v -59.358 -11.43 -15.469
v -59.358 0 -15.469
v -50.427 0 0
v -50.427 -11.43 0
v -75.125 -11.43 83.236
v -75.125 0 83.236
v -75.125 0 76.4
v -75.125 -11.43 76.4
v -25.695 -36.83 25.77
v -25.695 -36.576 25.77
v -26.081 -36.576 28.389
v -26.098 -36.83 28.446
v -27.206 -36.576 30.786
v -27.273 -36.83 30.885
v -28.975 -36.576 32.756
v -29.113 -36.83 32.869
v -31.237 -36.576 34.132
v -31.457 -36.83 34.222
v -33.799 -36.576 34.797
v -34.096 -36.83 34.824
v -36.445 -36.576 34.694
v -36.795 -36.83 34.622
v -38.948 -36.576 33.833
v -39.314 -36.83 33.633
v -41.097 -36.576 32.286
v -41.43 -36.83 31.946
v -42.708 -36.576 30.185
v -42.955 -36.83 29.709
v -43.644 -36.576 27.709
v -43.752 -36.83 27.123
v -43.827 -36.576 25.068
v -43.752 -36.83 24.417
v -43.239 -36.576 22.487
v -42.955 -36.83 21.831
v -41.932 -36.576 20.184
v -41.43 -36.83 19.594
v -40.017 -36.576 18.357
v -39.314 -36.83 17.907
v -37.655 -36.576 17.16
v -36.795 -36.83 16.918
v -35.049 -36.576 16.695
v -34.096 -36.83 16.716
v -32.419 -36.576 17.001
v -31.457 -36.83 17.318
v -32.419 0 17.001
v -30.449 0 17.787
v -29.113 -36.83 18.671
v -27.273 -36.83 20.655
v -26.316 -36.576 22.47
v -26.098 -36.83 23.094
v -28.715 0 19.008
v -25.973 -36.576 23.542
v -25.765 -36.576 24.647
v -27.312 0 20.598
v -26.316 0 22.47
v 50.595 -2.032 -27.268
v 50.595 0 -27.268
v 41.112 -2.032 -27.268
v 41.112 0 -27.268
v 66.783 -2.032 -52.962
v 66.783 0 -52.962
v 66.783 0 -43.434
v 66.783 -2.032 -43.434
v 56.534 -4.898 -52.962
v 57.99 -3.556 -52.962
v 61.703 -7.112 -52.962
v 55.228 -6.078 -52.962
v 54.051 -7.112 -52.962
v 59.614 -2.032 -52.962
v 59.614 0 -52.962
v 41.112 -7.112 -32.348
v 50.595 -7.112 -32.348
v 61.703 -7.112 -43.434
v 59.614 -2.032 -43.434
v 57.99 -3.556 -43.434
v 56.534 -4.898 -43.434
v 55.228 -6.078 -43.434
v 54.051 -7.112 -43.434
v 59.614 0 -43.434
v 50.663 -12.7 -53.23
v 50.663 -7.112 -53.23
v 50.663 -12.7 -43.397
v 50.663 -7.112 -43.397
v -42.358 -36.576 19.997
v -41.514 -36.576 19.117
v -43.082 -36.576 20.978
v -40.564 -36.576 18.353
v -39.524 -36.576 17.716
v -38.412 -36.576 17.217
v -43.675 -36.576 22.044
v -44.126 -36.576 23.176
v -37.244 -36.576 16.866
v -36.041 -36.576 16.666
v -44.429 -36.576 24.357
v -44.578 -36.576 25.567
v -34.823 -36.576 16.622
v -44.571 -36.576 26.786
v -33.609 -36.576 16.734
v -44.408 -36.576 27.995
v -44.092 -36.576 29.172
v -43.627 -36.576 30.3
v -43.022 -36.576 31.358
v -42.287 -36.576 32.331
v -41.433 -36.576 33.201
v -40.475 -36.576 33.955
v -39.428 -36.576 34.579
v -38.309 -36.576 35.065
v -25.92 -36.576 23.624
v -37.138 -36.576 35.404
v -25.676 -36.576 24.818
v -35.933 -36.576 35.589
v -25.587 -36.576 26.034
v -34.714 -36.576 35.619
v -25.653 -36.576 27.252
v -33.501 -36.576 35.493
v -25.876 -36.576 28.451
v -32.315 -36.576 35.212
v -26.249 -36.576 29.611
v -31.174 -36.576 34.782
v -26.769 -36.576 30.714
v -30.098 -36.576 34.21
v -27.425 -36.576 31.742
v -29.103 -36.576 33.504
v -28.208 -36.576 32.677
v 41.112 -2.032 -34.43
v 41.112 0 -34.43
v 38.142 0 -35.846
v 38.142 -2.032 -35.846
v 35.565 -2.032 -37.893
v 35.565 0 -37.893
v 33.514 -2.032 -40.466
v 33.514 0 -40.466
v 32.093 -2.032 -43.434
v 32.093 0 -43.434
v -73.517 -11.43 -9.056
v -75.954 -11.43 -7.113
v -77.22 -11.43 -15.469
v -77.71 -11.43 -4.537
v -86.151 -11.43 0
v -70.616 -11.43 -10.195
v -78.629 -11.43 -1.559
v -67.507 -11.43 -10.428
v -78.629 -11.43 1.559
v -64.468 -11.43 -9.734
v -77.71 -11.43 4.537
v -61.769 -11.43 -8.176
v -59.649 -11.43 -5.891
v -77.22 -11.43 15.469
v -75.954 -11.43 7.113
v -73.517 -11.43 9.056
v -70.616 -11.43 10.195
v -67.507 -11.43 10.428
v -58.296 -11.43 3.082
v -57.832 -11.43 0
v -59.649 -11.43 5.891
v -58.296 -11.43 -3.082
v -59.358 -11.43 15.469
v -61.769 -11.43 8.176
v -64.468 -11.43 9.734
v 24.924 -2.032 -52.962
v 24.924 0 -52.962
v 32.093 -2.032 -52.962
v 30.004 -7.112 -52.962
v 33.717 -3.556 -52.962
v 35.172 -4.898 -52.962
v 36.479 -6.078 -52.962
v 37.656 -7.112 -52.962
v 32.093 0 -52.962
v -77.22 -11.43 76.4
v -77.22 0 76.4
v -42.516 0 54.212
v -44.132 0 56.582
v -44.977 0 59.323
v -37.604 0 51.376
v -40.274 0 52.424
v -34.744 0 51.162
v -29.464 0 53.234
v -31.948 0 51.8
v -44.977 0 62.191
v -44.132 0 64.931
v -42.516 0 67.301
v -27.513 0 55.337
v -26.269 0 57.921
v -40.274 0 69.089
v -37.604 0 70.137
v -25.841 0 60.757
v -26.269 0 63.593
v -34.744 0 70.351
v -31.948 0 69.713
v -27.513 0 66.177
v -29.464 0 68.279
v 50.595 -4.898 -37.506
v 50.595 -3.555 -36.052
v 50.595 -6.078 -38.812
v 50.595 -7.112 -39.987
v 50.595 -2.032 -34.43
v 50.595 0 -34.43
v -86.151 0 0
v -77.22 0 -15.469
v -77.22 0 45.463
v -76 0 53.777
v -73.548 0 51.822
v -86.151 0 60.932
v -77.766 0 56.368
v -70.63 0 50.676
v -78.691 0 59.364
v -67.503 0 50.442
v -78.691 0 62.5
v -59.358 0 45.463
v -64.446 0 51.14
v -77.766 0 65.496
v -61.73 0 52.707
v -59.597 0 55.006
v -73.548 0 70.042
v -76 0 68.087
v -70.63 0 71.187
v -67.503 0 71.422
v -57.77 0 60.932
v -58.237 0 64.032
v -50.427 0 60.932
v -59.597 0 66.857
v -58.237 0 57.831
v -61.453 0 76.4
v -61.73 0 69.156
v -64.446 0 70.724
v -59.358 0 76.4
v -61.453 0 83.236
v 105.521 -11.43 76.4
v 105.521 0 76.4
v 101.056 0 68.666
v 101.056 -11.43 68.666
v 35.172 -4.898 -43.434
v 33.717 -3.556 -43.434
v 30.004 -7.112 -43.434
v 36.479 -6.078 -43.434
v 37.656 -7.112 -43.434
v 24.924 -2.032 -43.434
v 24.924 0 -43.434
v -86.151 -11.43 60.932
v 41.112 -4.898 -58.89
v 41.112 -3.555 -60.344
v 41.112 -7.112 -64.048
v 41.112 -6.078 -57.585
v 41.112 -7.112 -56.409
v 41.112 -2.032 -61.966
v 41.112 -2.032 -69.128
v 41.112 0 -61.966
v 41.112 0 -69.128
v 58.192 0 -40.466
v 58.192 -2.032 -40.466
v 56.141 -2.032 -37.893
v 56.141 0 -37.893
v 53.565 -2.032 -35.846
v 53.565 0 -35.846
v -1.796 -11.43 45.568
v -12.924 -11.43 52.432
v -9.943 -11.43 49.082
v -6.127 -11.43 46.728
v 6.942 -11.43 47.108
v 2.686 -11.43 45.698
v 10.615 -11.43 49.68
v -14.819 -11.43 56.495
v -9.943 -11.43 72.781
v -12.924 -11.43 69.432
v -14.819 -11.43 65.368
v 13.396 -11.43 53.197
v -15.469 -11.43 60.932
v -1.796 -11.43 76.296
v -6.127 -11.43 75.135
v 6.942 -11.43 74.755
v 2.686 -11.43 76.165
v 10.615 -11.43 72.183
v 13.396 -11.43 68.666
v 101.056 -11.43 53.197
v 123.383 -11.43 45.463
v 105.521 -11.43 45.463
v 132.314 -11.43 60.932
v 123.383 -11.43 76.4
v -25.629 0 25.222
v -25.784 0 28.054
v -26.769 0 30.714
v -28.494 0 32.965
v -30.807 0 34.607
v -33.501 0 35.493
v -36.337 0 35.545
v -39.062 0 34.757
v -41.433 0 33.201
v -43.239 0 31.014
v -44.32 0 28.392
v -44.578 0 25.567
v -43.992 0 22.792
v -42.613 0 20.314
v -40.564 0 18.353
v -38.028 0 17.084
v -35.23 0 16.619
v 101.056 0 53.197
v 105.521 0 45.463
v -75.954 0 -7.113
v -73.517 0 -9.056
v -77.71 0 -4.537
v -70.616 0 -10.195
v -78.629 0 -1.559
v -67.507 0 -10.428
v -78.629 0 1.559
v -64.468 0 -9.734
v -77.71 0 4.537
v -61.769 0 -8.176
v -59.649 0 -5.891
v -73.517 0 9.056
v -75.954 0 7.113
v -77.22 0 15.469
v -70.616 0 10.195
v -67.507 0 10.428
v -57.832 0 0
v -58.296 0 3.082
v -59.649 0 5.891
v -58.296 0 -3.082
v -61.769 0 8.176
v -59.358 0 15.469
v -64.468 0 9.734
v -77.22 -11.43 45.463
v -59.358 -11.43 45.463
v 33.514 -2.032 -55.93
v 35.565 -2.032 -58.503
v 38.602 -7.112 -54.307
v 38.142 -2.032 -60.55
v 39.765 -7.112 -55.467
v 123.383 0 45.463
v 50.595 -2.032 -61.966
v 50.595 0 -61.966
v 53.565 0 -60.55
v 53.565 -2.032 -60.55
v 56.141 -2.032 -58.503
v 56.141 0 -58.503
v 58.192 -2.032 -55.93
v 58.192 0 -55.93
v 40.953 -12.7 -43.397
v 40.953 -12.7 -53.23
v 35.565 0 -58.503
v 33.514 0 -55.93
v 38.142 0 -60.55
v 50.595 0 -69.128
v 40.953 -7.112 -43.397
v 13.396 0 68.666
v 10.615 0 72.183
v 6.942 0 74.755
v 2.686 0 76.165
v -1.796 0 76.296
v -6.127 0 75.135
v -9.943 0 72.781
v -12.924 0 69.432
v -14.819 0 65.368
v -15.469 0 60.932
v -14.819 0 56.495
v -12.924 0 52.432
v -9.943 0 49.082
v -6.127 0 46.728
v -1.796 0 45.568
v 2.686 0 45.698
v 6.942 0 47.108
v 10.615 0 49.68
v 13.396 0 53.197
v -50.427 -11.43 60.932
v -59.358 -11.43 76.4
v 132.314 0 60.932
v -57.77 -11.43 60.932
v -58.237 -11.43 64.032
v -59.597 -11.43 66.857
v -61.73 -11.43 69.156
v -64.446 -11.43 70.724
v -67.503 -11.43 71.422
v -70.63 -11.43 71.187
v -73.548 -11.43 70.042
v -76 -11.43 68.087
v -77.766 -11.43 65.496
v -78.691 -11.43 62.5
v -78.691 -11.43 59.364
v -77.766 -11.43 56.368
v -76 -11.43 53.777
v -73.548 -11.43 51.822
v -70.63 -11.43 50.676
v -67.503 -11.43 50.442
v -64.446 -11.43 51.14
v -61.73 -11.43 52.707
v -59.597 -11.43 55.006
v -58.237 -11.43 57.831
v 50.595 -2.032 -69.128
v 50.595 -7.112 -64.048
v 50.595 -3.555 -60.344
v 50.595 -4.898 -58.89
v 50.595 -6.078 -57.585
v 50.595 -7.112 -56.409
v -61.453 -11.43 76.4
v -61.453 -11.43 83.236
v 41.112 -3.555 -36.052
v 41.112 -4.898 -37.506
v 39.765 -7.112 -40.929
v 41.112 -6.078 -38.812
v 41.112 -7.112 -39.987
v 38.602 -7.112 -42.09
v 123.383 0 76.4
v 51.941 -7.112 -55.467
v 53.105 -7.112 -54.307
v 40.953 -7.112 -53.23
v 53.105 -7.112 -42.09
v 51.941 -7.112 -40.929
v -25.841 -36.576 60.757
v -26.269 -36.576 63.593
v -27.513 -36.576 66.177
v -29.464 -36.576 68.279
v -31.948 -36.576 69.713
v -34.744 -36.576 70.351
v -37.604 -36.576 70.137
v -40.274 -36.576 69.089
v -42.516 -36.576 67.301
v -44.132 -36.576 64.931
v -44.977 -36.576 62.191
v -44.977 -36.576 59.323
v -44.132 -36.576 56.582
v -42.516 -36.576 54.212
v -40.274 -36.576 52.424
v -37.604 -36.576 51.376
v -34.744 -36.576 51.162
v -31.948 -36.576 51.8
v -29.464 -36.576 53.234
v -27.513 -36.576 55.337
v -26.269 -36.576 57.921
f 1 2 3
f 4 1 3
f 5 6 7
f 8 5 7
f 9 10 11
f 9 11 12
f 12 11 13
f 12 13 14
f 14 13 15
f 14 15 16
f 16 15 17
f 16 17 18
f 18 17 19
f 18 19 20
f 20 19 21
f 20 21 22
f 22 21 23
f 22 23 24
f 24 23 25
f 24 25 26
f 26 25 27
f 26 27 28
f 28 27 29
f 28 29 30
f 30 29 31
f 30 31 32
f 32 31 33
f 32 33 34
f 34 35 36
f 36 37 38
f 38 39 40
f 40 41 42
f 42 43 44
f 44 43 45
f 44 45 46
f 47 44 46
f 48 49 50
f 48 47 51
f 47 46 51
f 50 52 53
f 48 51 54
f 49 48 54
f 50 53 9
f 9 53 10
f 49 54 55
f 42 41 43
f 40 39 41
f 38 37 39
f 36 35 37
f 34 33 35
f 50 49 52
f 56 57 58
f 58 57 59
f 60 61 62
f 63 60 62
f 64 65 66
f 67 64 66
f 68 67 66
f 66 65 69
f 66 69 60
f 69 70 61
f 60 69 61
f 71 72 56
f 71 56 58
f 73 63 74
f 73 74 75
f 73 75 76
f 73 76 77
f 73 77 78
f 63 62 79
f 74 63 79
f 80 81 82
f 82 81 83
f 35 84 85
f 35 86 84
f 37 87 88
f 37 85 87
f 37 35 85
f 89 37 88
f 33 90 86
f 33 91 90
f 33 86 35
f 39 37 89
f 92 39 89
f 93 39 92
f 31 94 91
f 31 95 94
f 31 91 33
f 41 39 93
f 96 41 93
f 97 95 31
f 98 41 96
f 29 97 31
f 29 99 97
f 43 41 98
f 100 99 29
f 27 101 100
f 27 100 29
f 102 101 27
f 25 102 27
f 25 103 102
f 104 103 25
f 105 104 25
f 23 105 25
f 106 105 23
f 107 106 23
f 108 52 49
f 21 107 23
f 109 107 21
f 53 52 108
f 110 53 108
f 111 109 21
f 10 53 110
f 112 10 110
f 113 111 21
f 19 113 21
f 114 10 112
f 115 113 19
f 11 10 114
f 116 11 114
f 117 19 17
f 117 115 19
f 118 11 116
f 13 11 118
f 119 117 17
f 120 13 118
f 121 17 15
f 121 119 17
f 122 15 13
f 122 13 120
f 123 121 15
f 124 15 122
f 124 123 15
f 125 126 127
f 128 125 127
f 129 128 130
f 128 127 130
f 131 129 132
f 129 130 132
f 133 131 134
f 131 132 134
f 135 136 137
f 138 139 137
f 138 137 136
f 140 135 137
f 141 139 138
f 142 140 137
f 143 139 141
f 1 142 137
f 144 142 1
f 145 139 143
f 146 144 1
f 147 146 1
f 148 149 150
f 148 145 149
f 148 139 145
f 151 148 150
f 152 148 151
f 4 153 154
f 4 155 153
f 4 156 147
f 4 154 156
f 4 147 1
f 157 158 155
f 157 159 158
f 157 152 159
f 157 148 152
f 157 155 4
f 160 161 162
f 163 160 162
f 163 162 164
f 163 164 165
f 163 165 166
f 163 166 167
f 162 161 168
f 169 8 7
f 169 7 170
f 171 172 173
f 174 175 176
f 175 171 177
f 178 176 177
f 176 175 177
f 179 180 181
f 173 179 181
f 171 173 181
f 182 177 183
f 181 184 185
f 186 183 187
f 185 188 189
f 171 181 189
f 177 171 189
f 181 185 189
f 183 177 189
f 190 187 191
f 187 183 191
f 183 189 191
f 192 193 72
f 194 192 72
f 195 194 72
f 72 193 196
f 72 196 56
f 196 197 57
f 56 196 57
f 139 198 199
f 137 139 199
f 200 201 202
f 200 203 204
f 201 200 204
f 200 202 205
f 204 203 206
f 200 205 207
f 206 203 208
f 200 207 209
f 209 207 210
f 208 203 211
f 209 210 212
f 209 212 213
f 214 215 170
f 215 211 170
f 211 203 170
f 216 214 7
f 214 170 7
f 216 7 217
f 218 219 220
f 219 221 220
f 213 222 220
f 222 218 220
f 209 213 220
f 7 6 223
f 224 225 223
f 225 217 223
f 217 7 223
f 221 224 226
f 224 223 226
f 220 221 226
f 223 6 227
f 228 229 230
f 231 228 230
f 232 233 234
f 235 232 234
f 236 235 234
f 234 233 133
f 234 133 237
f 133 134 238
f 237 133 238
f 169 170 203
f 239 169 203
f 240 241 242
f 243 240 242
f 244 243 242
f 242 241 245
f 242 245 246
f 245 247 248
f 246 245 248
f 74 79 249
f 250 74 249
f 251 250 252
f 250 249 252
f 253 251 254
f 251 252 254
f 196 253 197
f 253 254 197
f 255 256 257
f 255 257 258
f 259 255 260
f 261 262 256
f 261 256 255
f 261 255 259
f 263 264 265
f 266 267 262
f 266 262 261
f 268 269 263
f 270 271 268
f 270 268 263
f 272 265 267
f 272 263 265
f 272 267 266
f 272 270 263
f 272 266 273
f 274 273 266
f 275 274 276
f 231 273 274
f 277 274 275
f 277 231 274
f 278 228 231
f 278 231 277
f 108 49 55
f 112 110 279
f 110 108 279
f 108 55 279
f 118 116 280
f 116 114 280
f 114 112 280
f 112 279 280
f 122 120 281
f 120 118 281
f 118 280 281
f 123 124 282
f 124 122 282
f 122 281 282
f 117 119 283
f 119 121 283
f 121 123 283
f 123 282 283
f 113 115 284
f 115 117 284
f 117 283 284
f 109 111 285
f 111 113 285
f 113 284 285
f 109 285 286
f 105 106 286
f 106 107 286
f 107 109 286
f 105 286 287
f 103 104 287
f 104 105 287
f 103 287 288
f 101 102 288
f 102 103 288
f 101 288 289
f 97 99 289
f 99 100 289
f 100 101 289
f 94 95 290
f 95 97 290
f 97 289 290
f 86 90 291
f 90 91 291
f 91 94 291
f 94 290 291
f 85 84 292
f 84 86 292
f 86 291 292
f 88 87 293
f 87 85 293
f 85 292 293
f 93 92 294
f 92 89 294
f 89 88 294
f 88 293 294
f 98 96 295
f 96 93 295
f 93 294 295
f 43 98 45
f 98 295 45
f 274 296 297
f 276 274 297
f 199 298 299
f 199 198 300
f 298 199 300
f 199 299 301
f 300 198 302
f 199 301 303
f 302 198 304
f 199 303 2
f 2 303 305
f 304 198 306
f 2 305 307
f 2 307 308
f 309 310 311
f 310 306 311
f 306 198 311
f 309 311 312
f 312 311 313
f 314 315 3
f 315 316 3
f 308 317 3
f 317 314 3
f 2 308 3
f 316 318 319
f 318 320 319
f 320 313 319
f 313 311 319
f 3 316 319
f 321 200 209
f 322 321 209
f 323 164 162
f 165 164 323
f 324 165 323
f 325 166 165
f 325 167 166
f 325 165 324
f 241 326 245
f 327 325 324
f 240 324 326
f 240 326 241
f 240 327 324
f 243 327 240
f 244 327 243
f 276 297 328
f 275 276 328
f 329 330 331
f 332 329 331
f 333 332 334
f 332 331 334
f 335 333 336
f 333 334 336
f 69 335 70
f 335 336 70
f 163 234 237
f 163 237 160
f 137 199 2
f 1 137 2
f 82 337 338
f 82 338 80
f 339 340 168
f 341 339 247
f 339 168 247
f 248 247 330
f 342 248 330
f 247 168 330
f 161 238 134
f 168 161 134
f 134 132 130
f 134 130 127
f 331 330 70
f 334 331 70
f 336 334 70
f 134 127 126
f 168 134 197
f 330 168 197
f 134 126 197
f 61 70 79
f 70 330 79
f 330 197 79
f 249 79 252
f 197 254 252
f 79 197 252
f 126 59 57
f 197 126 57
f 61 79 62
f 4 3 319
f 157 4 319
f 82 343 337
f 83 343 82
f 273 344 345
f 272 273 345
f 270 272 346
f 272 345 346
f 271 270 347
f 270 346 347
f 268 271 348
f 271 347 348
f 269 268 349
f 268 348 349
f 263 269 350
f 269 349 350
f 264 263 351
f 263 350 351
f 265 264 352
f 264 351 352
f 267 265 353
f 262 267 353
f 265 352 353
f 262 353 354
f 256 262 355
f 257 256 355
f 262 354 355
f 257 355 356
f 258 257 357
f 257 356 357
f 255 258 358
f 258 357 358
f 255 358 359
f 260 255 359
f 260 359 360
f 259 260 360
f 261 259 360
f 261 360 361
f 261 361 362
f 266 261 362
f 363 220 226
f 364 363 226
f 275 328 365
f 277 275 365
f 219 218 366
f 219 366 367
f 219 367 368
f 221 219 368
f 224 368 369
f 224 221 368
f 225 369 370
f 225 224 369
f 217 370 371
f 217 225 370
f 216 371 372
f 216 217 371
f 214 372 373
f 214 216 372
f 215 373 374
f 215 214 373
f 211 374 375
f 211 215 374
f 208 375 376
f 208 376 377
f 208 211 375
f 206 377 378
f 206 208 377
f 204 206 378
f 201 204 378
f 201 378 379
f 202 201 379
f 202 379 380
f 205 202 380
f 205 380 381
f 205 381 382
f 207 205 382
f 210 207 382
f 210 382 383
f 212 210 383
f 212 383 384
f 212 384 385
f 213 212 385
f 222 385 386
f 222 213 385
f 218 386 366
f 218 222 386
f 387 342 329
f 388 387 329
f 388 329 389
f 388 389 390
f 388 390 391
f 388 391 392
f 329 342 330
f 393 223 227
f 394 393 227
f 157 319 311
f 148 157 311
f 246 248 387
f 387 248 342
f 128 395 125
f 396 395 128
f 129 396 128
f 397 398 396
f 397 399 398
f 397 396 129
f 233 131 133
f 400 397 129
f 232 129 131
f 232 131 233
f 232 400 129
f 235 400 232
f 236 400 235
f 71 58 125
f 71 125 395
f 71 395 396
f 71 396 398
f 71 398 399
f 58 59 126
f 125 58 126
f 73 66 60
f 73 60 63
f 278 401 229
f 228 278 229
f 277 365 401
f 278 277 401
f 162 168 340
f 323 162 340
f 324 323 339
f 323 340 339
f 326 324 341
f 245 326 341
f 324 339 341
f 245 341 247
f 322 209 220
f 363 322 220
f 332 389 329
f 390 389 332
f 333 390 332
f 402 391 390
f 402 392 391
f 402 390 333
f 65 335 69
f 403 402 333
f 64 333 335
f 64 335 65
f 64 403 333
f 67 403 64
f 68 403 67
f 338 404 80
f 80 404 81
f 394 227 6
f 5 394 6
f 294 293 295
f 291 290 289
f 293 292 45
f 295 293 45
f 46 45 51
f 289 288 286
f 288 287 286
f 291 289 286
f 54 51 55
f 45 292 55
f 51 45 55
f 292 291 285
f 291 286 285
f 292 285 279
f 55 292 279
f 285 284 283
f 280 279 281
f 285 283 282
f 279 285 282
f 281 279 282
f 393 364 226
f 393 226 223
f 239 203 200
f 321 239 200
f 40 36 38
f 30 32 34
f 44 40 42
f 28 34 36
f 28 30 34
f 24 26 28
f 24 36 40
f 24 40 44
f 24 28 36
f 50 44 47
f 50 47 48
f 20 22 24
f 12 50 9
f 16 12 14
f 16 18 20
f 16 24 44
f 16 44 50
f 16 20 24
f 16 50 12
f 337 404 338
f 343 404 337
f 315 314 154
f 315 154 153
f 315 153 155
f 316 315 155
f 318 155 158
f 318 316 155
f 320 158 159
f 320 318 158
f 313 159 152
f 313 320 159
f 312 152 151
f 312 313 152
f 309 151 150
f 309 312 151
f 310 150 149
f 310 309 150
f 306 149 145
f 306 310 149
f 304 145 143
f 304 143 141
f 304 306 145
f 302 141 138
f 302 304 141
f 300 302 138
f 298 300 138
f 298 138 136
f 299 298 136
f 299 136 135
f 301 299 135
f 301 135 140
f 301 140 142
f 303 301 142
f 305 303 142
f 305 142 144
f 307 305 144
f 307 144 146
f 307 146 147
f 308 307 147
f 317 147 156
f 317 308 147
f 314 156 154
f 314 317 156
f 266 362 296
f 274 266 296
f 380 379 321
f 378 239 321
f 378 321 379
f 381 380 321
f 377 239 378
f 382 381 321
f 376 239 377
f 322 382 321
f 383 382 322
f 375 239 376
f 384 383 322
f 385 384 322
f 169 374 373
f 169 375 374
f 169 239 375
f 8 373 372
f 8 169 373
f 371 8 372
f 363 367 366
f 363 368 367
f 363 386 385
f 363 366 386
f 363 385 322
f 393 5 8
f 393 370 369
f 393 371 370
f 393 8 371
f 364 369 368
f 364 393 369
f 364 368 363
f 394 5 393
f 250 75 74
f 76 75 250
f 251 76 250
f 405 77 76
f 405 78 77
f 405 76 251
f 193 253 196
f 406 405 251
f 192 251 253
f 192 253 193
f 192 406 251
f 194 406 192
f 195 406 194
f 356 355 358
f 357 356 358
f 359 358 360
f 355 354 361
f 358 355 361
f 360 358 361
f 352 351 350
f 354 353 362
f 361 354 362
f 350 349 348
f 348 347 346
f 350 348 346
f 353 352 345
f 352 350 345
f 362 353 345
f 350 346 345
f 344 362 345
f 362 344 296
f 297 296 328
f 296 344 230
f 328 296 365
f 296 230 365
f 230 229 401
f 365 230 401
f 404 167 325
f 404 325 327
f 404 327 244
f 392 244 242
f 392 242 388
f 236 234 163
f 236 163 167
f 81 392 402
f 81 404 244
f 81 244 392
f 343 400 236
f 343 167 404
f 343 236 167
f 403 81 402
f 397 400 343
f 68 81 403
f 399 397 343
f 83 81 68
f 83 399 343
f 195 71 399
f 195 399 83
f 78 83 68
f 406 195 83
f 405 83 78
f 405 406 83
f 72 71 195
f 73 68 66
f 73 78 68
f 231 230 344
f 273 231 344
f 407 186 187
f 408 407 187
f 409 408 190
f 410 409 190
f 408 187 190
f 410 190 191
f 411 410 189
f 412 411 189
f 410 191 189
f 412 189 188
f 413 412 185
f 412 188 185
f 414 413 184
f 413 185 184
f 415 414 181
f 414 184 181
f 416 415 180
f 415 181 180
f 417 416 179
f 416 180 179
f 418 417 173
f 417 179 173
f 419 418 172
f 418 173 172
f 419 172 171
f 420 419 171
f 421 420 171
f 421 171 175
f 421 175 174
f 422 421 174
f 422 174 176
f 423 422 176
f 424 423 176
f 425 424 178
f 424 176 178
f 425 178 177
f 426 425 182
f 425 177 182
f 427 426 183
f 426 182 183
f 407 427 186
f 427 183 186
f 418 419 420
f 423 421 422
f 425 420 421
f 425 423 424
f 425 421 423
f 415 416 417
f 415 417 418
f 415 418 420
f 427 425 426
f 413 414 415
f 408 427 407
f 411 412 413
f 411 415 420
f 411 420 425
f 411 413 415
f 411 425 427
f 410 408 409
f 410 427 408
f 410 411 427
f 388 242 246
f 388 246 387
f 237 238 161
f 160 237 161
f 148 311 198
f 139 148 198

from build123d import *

# Parameters (mm, degrees)
F0_R      = 10.519302146
F1_DEPTH  = 11.43
F0_R_2    = 10.4571143602
F2_R      = 9.5042113309
F3_DEPTH  = 36.576
F2_R_2    = 9.621642993
F5_DEPTH  = 7.112
F6_SIZE   = 5.08
F7_W      = 9.7099430859
F7_H      = 9.8328515887
F8_DEPTH  = 12.7
F9_R      = 9.0793803352
F10_DEPTH = 36.83


with BuildPart() as f1:
    # F0 (on Front) → F1 (new body)
    with BuildSketch(Plane.XZ):
        Polygon((-75.1246213913, 76.4004662633), (-77.2196794092, 76.4004662633), (-86.1505557177, 60.9317347407), (-77.2196794092, 45.4630032182), (-59.357926792, 45.4630032182), (-50.4270504834, 60.9317347407), (-59.357926792, 76.4004662633), (-61.4529848099, 76.4004662633), (-61.4529848099, 69.5646479726), (-68.2888031006, 76.4004662633), (-75.1246213913, 69.5646479726), align=None)
        with Locations((-68.2888031006, 60.9317347407)):
            Circle(F0_R, mode=Mode.SUBTRACT)
        Polygon((-75.1246213913, 83.236284554), (-75.1246213913, 76.4004662633), (-68.2888031006, 76.4004662633), (-61.4529848099, 76.4004662633), (-61.4529848099, 83.236284554), align=None)
        Polygon((-68.2888031006, 76.4004662633), (-75.1246213913, 76.4004662633), (-75.1246213913, 69.5646479726), align=None)
        Polygon((-61.4529848099, 76.4004662633), (-68.2888031006, 76.4004662633), (-61.4529848099, 69.5646479726), align=None)
    extrude(amount=F1_DEPTH)


with BuildPart() as f1b:
    # F0 (on Front) → F1, piece 2 (new body)
    with BuildSketch(Plane.XZ):
        with BuildLine():
            ThreePointArc((15.4687315226, 60.9317347407), (14.9416472776, 64.9353370624), (13.3963144629, 68.666100502))
            Line((13.3963144629, 68.666100502), (13.3963144629, 53.1973689795))
            ThreePointArc((13.3963144629, 53.1973689795), (14.9416472776, 56.9281324191), (15.4687315226, 60.9317347407))
        make_face()
        with BuildLine():
            Line((101.0556601675, 68.666100502), (13.3963144629, 68.666100502))
            ThreePointArc((13.3963144629, 68.666100502), (14.9416472776, 64.9353370624), (15.4687315226, 60.9317347407))
            ThreePointArc((15.4687315226, 60.9317347407), (14.9416472776, 56.9281324191), (13.3963144629, 53.1973689795))
            Line((13.3963144629, 53.1973689795), (101.0556601675, 53.1973689795))
            Line((101.0556601675, 53.1973689795), (96.5902220132, 60.9317347407))
            Line((96.5902220132, 60.9317347407), (101.0556601675, 68.666100502))
        make_face()
        with BuildLine():
            Line((13.3963144629, 53.1973689795), (13.3963144629, 68.666100502))
            ThreePointArc((13.3963144629, 68.666100502), (-15.4687315226, 60.9317347407), (13.3963144629, 53.1973689795))
        make_face()
        Polygon((105.5210983218, 76.4004662633), (101.0556601675, 68.666100502), (114.4519746304, 68.666100502), (114.4519746304, 53.1973689795), (101.0556601675, 53.1973689795), (105.5210983218, 45.4630032182), (123.3828509389, 45.4630032182), (132.3137272475, 60.9317347407), (123.3828509389, 76.4004662633), align=None)
        Polygon((114.4519746304, 68.666100502), (101.0556601675, 68.666100502), (96.5902220132, 60.9317347407), (101.0556601675, 53.1973689795), (114.4519746304, 53.1973689795), align=None)
    extrude(amount=F1_DEPTH)


with BuildPart() as f1c:
    # F0 (on Front) → F1, piece 3 (new body)
    with BuildSketch(Plane.XZ):
        Polygon((-59.357926792, -15.4687315226), (-50.4270504834, 0), (-59.357926792, 15.4687315226), (-77.2196794092, 15.4687315226), (-86.1505557177, 0), (-77.2196794092, -15.4687315226), align=None)
        with Locations((-68.2888031006, 0)):
            Circle(F0_R_2, mode=Mode.SUBTRACT)
    extrude(amount=F1_DEPTH)


with BuildPart() as f3:
    # F2 (on Front) → F3 (new body)
    with BuildSketch(Plane.XZ):
        with Locations((-35.0903049111, 26.1225104332)):
            Circle(F2_R)
    extrude(amount=F3_DEPTH)

    # F9 (on Front) → F10 (join)
    with BuildSketch(Plane.XZ):
        with Locations((-34.7743965685, 25.7699601352)):
            Circle(F9_R)
    extrude(amount=F10_DEPTH)


with BuildPart() as f3b:
    # F2 (on Front) → F3, piece 2 (new body)
    with BuildSketch(Plane.XZ):
        with Locations((-35.4631394148, 60.7567168772)):
            Circle(F2_R_2)
    extrude(amount=F3_DEPTH)


with BuildPart() as f5:
    # F4 (on Front) → F5 (new body)
    with BuildSketch(Plane.XZ):
        with BuildLine():
            ThreePointArc((59.6135334386, -52.9624782503), (60.2132493643, -50.6137481904), (60.4150185059, -48.1980741024))
            ThreePointArc((60.4150185059, -48.1980741024), (60.2132493643, -45.7824000144), (59.6135334386, -43.4336699545))
            Line((59.6135334386, -43.4336699545), (50.5945459008, -43.4336699545))
            Line((50.5945459008, -43.4336699545), (50.5945459008, -52.9624782503))
            Line((50.5945459008, -52.9624782503), (59.6135334386, -52.9624782503))
        make_face()
        with BuildLine():
            ThreePointArc((59.6135334386, -43.4336699545), (60.2132493643, -45.7824000144), (60.4150185059, -48.1980741024))
            ThreePointArc((60.4150185059, -48.1980741024), (60.2132493643, -50.6137481904), (59.6135334386, -52.9624782503))
            Line((59.6135334386, -52.9624782503), (66.783182323, -52.9624782503))
            Line((66.783182323, -52.9624782503), (66.783182323, -43.4336699545))
            Line((66.783182323, -43.4336699545), (59.6135334386, -43.4336699545))
        make_face()
        with BuildLine():
            Line((50.5945459008, -43.4336699545), (59.6135334386, -43.4336699545))
            ThreePointArc((59.6135334386, -43.4336699545), (56.1413204063, -37.8927413191), (50.5945459008, -34.4298745776))
            Line((50.5945459008, -34.4298745776), (50.5945459008, -43.4336699545))
        make_face()
        with BuildLine():
            ThreePointArc((50.5945459008, -61.9662736272), (56.1413204063, -58.5034068857), (59.6135334386, -52.9624782503))
            Line((59.6135334386, -52.9624782503), (50.5945459008, -52.9624782503))
            Line((50.5945459008, -52.9624782503), (50.5945459008, -61.9662736272))
        make_face()
        with BuildLine():
            Line((50.5945459008, -43.4336699545), (50.5945459008, -34.4298745776))
            ThreePointArc((50.5945459008, -34.4298745776), (45.8533465862, -33.6364021827), (41.1121472716, -34.4298745776))
            Line((41.1121472716, -34.4298745776), (41.1121472716, -43.4336699545))
            Line((41.1121472716, -43.4336699545), (50.5945459008, -43.4336699545))
        make_face()
        with BuildLine():
            ThreePointArc((41.1121472716, -34.4298745776), (45.8533465862, -33.6364021827), (50.5945459008, -34.4298745776))
            Line((50.5945459008, -34.4298745776), (50.5945459008, -27.2682383657))
            Line((50.5945459008, -27.2682383657), (41.1121472716, -27.2682383657))
            Line((41.1121472716, -27.2682383657), (41.1121472716, -34.4298745776))
        make_face()
        with BuildLine():
            Line((50.5945459008, -69.1279098392), (50.5945459008, -61.9662736272))
            ThreePointArc((50.5945459008, -61.9662736272), (45.8533465862, -62.7597460221), (41.1121472716, -61.9662736272))
            Line((41.1121472716, -61.9662736272), (41.1121472716, -69.1279098392))
            Line((41.1121472716, -69.1279098392), (50.5945459008, -69.1279098392))
        make_face()
        with BuildLine():
            ThreePointArc((41.1121472716, -61.9662736272), (45.8533465862, -62.7597460221), (50.5945459008, -61.9662736272))
            Line((50.5945459008, -61.9662736272), (50.5945459008, -52.9624782503))
            Line((50.5945459008, -52.9624782503), (41.1121472716, -52.9624782503))
            Line((41.1121472716, -52.9624782503), (41.1121472716, -61.9662736272))
        make_face()
        with BuildLine():
            Line((41.1121472716, -43.4336699545), (41.1121472716, -34.4298745776))
            ThreePointArc((41.1121472716, -34.4298745776), (35.5653727662, -37.8927413191), (32.0931597339, -43.4336699545))
            Line((32.0931597339, -43.4336699545), (41.1121472716, -43.4336699545))
        make_face()
        with BuildLine():
            Line((41.1121472716, -52.9624782503), (41.1121472716, -43.4336699545))
            Line((41.1121472716, -43.4336699545), (32.0931597339, -43.4336699545))
            ThreePointArc((32.0931597339, -43.4336699545), (31.2916746666, -48.1980741024), (32.0931597339, -52.9624782503))
            Line((32.0931597339, -52.9624782503), (41.1121472716, -52.9624782503))
        make_face()
        with BuildLine():
            ThreePointArc((32.0931597339, -52.9624782503), (35.5653727662, -58.5034068857), (41.1121472716, -61.9662736272))
            Line((41.1121472716, -61.9662736272), (41.1121472716, -52.9624782503))
            Line((41.1121472716, -52.9624782503), (32.0931597339, -52.9624782503))
        make_face()
        with BuildLine():
            ThreePointArc((32.0931597339, -52.9624782503), (31.2916746666, -48.1980741024), (32.0931597339, -43.4336699545))
            Line((32.0931597339, -43.4336699545), (24.9235108495, -43.4336699545))
            Line((24.9235108495, -43.4336699545), (24.9235108495, -52.9624782503))
            Line((24.9235108495, -52.9624782503), (32.0931597339, -52.9624782503))
        make_face()
    extrude(amount=F5_DEPTH)

    # F6
    f6_edges = [f5.edges().sort_by_distance(p)[0] for p in [
        (45.853347, -7.112, -27.268238),
        (66.783182, -7.112, -48.198074),
        (45.853347, -7.112, -69.12791),
        (24.923511, -7.112, -48.198074),
        (56.14132, -7.112, -37.892741),
        (56.14132, -7.112, -58.503407),
        (35.565373, -7.112, -37.892741),
        (35.565373, -7.112, -58.503407),
    ]]
    chamfer(f6_edges, length=F6_SIZE)

    # F7 (on Front) → F8 (join)
    with BuildSketch(Plane.XZ):
        with Locations((45.8080749959, -48.3138300478)):
            Rectangle(F7_W, F7_H)
    extrude(amount=F8_DEPTH)


solid = Compound([f1.part, f1b.part, f1c.part, f3.part, f3b.part, f5.part])
